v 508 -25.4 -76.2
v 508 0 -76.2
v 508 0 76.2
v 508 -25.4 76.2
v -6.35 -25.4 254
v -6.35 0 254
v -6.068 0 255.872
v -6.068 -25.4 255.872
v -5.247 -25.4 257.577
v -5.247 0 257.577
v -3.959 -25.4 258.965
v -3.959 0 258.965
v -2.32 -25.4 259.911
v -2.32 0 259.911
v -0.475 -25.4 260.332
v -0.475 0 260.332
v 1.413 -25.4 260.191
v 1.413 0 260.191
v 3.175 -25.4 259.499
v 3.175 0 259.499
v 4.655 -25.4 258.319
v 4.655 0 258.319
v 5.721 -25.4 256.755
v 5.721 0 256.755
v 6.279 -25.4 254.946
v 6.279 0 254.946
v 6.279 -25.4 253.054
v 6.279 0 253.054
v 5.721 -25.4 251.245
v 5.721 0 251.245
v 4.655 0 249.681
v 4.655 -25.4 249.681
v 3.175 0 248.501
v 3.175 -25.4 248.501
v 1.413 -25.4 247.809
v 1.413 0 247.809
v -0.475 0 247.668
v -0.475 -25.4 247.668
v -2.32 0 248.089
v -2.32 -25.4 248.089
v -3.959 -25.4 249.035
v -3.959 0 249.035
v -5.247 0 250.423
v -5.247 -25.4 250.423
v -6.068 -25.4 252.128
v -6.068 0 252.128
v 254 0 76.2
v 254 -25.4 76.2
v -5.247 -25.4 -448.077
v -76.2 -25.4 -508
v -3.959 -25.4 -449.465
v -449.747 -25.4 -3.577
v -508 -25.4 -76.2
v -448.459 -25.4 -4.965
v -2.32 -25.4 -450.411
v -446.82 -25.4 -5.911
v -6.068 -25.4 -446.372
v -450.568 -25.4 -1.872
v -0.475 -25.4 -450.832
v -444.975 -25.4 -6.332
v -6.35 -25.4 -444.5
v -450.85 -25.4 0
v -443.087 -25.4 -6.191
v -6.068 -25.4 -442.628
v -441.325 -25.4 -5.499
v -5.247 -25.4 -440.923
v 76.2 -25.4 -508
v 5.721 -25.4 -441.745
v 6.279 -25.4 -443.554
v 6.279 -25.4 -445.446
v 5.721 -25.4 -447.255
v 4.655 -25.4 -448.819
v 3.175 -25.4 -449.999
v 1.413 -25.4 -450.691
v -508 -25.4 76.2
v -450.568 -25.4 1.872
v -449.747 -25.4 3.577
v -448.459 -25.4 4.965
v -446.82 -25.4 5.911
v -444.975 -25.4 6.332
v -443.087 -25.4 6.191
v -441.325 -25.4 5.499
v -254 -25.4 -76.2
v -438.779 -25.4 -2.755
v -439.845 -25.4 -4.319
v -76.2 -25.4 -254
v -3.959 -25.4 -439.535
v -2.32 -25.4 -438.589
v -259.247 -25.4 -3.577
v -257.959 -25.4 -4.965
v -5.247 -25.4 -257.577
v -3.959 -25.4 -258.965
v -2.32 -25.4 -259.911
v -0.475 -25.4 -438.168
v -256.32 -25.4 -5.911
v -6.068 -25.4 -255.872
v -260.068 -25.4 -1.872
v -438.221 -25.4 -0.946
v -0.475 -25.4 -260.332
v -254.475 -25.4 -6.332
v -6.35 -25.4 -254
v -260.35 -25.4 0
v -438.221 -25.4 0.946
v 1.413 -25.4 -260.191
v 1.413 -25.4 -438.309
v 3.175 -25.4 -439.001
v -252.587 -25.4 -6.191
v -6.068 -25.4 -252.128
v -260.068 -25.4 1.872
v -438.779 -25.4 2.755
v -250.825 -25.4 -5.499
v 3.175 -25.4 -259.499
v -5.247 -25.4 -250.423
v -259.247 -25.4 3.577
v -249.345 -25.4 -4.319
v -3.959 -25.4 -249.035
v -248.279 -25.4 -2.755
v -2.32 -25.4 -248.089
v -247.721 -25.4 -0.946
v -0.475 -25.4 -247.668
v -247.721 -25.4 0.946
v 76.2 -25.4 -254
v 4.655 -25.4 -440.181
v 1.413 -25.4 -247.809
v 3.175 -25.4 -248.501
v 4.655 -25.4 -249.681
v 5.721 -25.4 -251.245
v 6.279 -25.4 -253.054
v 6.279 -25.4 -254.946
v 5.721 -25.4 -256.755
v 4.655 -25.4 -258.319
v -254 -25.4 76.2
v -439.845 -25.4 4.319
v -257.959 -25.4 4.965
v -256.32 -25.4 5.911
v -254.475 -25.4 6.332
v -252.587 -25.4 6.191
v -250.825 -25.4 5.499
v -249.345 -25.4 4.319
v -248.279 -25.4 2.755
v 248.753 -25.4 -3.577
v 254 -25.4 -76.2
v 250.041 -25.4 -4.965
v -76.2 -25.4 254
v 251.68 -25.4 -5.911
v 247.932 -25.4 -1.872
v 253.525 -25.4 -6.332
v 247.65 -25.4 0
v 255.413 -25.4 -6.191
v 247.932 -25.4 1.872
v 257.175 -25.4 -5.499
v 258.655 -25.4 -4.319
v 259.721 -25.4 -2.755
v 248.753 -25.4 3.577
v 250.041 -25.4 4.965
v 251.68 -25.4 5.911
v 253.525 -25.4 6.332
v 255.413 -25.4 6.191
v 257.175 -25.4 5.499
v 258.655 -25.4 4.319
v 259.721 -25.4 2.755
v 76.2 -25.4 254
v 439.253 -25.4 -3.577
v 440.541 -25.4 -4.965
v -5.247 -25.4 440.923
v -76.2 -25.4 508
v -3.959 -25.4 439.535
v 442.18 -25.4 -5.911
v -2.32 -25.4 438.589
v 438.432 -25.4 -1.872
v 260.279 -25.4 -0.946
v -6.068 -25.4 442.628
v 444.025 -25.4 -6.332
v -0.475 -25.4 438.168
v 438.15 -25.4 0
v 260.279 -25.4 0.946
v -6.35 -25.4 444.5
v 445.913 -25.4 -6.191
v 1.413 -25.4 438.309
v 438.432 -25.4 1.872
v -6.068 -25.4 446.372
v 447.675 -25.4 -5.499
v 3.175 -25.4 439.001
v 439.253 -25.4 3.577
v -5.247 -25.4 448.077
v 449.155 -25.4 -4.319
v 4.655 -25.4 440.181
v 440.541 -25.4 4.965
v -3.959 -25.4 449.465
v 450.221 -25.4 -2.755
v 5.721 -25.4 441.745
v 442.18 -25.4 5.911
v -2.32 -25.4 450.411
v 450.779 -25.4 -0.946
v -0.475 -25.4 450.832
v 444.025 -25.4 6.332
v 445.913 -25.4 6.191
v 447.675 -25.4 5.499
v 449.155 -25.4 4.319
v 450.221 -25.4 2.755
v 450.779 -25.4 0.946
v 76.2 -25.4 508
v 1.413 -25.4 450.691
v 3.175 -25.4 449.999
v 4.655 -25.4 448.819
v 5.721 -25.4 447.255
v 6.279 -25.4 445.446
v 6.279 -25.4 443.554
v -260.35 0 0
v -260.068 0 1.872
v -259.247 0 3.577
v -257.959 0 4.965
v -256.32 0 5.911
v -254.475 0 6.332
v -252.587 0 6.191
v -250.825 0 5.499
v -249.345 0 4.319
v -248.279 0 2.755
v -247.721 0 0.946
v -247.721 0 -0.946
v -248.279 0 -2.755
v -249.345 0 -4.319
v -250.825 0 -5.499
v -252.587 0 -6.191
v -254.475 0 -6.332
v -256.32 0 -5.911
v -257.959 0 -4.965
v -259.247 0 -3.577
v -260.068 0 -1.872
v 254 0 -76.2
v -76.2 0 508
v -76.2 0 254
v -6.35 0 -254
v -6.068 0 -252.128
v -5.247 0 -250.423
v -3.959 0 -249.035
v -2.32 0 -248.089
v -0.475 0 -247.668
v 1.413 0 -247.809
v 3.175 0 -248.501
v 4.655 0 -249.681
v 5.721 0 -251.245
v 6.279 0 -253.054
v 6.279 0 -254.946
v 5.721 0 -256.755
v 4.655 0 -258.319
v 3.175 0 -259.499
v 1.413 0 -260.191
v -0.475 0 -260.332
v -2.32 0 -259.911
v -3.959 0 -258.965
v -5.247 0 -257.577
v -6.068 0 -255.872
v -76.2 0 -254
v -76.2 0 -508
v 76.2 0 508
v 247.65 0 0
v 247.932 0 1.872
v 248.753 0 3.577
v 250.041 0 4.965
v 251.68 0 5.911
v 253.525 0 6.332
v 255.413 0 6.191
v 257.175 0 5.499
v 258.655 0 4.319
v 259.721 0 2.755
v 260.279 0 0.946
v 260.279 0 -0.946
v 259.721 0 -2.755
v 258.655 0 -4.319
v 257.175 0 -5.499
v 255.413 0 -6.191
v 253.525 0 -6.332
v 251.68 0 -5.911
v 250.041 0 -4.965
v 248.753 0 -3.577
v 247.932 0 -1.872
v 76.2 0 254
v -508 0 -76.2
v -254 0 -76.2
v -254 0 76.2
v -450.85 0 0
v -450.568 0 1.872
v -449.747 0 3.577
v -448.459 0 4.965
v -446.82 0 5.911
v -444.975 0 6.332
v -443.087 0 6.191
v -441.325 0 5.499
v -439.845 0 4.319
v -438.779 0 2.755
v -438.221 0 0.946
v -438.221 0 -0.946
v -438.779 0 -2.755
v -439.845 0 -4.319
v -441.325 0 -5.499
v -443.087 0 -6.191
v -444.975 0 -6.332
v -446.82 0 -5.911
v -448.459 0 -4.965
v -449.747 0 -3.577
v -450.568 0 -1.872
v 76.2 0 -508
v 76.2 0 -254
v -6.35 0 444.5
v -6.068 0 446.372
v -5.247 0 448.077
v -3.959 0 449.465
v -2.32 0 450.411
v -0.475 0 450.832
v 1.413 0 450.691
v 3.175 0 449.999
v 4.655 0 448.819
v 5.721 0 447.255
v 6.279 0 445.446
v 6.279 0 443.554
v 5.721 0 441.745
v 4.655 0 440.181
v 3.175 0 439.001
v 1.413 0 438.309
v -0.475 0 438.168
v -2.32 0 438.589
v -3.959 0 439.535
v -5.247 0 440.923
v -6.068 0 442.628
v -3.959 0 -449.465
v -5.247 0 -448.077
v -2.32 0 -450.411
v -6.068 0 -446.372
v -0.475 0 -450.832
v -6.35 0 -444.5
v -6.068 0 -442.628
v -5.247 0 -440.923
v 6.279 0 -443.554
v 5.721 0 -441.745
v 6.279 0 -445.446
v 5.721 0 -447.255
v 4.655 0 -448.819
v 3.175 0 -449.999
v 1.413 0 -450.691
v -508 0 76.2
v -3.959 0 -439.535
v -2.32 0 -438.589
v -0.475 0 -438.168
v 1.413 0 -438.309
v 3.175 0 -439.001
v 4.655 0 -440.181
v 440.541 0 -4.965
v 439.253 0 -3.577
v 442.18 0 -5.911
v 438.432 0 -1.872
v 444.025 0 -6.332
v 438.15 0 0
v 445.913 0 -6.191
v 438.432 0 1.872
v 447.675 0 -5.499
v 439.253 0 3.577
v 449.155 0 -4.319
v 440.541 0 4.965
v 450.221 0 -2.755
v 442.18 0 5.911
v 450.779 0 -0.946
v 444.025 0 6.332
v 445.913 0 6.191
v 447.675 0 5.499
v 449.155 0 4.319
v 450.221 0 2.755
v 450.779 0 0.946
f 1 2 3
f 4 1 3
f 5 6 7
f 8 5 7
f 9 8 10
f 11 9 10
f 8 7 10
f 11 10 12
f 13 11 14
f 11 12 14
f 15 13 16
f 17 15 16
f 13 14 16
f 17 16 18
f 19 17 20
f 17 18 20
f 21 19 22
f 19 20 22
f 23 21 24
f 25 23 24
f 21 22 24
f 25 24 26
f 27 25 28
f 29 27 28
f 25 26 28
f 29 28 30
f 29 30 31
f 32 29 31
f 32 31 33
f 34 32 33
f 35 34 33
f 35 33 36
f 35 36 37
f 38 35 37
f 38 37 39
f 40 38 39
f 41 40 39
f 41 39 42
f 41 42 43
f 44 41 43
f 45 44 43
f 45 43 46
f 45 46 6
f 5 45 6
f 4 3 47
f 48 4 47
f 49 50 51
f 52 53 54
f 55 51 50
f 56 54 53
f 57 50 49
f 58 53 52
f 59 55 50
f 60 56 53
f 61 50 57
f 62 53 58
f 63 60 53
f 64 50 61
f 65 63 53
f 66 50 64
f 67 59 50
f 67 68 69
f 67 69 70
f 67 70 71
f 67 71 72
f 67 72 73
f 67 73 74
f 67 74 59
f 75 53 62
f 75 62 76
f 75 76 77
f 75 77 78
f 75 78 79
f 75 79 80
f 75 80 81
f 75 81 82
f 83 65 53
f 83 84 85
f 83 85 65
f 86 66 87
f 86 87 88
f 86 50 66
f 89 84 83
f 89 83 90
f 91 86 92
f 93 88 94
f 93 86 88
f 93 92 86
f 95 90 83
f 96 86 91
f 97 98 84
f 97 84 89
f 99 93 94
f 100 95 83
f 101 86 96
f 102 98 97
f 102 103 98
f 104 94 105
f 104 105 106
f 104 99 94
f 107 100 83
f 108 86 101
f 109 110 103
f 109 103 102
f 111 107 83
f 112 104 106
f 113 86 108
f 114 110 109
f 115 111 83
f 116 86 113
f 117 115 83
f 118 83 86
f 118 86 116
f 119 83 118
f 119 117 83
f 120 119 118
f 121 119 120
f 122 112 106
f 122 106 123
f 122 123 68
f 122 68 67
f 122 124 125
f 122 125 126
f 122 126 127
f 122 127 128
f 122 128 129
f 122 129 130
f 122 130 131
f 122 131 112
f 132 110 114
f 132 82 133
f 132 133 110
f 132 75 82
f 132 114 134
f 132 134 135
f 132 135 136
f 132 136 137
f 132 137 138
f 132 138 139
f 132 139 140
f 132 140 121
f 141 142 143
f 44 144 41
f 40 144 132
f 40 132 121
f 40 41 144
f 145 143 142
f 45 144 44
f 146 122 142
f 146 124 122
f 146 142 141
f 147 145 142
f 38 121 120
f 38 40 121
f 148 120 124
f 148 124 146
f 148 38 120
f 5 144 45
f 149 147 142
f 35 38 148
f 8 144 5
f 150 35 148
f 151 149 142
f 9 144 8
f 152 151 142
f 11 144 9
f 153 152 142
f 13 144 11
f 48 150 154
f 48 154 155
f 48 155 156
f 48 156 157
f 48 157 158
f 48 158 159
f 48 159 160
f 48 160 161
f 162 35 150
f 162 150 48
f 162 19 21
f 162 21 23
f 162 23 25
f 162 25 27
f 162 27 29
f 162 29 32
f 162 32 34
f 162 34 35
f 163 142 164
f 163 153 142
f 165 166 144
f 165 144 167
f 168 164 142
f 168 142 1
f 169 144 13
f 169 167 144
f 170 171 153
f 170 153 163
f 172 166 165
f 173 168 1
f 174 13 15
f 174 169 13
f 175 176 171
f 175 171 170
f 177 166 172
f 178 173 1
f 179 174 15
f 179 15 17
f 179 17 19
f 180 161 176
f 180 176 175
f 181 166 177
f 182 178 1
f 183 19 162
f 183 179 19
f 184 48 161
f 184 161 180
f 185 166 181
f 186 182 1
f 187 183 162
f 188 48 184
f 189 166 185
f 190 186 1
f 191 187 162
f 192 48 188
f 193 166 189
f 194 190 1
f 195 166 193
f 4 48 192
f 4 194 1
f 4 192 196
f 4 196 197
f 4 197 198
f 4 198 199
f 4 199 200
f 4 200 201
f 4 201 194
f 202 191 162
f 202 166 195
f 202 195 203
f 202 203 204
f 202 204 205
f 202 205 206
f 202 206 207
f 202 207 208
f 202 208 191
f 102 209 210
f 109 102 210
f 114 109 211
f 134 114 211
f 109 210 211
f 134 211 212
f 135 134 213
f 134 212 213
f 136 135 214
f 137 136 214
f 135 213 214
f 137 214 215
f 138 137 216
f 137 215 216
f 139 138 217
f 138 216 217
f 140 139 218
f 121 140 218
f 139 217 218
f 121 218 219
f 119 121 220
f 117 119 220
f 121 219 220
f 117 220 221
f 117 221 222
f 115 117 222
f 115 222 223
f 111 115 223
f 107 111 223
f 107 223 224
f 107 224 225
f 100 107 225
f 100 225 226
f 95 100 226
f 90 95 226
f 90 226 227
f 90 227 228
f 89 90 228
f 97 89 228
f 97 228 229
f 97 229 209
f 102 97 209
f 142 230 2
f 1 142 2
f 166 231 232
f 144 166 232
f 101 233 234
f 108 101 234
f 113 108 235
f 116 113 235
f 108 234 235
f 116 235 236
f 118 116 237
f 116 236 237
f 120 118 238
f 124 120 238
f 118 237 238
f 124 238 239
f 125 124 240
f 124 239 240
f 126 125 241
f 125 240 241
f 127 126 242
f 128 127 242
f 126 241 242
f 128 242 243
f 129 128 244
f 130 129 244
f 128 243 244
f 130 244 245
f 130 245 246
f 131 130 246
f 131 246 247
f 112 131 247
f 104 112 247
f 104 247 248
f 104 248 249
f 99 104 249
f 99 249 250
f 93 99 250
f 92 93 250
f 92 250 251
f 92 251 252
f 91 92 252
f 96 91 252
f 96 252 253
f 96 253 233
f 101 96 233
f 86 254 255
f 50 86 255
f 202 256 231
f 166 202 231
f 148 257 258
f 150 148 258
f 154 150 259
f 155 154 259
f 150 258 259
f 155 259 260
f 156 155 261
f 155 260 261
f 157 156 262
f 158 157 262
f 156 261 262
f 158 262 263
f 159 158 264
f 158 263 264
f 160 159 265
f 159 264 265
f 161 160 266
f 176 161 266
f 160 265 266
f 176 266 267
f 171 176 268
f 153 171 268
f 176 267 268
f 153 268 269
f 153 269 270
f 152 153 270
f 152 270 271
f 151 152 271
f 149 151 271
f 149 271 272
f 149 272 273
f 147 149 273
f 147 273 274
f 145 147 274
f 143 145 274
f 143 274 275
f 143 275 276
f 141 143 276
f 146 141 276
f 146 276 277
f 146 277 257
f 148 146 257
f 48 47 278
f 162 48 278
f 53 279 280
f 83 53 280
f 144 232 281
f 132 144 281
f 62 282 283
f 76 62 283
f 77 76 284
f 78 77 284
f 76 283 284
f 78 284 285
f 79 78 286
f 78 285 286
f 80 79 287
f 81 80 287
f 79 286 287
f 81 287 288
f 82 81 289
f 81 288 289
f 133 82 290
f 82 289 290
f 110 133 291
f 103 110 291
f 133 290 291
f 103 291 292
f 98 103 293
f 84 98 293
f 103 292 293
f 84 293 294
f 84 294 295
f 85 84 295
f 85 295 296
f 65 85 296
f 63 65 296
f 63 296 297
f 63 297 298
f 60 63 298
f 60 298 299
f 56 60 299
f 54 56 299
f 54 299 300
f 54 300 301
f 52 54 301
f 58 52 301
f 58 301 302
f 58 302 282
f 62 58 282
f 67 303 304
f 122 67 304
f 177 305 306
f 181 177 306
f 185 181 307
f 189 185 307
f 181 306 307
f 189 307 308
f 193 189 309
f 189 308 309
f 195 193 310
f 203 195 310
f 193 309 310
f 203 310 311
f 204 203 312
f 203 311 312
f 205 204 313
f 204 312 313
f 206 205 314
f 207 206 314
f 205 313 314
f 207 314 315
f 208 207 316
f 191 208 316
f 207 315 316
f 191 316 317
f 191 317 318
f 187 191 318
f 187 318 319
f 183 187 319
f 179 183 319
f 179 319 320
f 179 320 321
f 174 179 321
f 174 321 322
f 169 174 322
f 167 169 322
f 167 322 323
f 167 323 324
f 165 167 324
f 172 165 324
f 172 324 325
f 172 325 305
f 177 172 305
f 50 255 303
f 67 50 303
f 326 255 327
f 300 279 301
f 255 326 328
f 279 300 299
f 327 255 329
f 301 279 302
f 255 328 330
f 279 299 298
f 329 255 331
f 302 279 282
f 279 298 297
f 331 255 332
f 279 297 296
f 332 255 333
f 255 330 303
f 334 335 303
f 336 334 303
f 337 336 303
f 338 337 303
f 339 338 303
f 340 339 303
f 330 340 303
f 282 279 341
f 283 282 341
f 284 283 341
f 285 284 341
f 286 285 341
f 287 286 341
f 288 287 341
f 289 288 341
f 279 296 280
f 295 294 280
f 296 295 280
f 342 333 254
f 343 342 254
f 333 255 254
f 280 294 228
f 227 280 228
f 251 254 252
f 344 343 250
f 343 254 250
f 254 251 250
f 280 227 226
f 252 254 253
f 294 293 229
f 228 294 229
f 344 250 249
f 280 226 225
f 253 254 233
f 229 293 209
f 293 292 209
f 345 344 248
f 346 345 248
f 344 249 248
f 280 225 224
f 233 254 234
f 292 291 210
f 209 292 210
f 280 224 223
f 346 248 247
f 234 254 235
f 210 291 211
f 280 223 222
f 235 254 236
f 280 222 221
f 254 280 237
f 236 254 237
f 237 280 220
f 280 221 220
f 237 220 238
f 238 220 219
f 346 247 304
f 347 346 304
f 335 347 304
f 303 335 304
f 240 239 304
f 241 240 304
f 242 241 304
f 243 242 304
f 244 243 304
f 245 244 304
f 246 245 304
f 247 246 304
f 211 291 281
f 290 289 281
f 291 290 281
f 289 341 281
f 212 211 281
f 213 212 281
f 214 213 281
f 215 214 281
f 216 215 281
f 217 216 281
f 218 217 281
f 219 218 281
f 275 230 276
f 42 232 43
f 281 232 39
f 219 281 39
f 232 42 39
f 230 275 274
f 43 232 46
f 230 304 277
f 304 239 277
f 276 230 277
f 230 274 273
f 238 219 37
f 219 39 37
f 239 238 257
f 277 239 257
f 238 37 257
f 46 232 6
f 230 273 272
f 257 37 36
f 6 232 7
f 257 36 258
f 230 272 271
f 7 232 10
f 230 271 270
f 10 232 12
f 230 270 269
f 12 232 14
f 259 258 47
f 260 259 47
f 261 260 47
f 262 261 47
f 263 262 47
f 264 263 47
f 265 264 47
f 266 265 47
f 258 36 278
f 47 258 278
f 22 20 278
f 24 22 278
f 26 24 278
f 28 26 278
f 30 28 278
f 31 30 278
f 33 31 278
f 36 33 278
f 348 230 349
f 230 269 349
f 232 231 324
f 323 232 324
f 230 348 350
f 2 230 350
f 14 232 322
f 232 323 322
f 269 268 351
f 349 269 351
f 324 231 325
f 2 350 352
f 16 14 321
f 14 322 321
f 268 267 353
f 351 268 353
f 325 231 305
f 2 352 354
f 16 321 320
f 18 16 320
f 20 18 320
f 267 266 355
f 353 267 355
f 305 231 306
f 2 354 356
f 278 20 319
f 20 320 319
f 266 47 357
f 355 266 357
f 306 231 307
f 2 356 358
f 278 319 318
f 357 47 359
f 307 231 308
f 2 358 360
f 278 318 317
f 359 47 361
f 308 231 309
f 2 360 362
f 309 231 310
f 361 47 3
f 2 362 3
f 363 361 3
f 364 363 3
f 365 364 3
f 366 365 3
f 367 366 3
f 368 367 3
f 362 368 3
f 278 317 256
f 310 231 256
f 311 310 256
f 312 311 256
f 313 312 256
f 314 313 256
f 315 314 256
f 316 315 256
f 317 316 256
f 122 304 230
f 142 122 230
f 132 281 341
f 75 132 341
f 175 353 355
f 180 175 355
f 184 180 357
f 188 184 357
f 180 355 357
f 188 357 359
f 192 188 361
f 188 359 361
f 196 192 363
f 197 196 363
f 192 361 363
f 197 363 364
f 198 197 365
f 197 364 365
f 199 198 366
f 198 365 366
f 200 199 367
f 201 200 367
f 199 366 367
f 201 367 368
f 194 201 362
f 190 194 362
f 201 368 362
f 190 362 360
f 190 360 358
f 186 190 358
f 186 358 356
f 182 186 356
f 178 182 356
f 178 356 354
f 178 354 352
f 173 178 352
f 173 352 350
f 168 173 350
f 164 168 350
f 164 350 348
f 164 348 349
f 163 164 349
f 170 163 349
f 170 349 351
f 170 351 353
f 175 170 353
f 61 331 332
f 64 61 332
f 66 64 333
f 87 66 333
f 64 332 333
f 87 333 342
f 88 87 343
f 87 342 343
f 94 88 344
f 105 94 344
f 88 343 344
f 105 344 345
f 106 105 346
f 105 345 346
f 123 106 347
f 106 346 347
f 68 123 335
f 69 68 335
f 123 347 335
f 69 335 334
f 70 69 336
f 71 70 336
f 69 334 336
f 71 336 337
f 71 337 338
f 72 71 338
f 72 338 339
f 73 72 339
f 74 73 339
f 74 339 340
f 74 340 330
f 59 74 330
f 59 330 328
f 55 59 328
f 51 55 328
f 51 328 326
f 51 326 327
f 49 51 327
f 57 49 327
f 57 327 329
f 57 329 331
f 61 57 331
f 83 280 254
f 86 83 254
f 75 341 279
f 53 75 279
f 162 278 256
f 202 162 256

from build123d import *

# Parameters (mm, degrees)
F1_DEPTH = 25.4
F3_D     = 12.7


with BuildPart() as f1:
    # F0 (on Front) → F1 (new body)
    with BuildSketch(Plane.XZ):
        Polygon((0, -508), (0, 0), (0, 508), (-76.2, 508), (-76.2, 254), (-254, 76.2), (-508, 76.2), (-508, -76.2), (-254, -76.2), (-76.2, -254), (-76.2, -508), align=None)
        Polygon((0, 508), (0, 0), (508, 0), (508, 76.2), (254, 76.2), (76.2, 254), (76.2, 508), align=None)
        Polygon((508, 0), (0, 0), (0, -508), (76.2, -508), (76.2, -254), (254, -76.2), (508, -76.2), align=None)
    extrude(amount=F1_DEPTH)

    # F3 (through all)
    with Locations(Plane.XZ.offset(25.4)):
        with Locations((0, 444.5), (0, 254), (254, 0), (444.5, 0), (0, -254), (0, -444.5), (-254, 0), (-444.5, 0)):
            Hole(F3_D / 2)


solid = f1.part
